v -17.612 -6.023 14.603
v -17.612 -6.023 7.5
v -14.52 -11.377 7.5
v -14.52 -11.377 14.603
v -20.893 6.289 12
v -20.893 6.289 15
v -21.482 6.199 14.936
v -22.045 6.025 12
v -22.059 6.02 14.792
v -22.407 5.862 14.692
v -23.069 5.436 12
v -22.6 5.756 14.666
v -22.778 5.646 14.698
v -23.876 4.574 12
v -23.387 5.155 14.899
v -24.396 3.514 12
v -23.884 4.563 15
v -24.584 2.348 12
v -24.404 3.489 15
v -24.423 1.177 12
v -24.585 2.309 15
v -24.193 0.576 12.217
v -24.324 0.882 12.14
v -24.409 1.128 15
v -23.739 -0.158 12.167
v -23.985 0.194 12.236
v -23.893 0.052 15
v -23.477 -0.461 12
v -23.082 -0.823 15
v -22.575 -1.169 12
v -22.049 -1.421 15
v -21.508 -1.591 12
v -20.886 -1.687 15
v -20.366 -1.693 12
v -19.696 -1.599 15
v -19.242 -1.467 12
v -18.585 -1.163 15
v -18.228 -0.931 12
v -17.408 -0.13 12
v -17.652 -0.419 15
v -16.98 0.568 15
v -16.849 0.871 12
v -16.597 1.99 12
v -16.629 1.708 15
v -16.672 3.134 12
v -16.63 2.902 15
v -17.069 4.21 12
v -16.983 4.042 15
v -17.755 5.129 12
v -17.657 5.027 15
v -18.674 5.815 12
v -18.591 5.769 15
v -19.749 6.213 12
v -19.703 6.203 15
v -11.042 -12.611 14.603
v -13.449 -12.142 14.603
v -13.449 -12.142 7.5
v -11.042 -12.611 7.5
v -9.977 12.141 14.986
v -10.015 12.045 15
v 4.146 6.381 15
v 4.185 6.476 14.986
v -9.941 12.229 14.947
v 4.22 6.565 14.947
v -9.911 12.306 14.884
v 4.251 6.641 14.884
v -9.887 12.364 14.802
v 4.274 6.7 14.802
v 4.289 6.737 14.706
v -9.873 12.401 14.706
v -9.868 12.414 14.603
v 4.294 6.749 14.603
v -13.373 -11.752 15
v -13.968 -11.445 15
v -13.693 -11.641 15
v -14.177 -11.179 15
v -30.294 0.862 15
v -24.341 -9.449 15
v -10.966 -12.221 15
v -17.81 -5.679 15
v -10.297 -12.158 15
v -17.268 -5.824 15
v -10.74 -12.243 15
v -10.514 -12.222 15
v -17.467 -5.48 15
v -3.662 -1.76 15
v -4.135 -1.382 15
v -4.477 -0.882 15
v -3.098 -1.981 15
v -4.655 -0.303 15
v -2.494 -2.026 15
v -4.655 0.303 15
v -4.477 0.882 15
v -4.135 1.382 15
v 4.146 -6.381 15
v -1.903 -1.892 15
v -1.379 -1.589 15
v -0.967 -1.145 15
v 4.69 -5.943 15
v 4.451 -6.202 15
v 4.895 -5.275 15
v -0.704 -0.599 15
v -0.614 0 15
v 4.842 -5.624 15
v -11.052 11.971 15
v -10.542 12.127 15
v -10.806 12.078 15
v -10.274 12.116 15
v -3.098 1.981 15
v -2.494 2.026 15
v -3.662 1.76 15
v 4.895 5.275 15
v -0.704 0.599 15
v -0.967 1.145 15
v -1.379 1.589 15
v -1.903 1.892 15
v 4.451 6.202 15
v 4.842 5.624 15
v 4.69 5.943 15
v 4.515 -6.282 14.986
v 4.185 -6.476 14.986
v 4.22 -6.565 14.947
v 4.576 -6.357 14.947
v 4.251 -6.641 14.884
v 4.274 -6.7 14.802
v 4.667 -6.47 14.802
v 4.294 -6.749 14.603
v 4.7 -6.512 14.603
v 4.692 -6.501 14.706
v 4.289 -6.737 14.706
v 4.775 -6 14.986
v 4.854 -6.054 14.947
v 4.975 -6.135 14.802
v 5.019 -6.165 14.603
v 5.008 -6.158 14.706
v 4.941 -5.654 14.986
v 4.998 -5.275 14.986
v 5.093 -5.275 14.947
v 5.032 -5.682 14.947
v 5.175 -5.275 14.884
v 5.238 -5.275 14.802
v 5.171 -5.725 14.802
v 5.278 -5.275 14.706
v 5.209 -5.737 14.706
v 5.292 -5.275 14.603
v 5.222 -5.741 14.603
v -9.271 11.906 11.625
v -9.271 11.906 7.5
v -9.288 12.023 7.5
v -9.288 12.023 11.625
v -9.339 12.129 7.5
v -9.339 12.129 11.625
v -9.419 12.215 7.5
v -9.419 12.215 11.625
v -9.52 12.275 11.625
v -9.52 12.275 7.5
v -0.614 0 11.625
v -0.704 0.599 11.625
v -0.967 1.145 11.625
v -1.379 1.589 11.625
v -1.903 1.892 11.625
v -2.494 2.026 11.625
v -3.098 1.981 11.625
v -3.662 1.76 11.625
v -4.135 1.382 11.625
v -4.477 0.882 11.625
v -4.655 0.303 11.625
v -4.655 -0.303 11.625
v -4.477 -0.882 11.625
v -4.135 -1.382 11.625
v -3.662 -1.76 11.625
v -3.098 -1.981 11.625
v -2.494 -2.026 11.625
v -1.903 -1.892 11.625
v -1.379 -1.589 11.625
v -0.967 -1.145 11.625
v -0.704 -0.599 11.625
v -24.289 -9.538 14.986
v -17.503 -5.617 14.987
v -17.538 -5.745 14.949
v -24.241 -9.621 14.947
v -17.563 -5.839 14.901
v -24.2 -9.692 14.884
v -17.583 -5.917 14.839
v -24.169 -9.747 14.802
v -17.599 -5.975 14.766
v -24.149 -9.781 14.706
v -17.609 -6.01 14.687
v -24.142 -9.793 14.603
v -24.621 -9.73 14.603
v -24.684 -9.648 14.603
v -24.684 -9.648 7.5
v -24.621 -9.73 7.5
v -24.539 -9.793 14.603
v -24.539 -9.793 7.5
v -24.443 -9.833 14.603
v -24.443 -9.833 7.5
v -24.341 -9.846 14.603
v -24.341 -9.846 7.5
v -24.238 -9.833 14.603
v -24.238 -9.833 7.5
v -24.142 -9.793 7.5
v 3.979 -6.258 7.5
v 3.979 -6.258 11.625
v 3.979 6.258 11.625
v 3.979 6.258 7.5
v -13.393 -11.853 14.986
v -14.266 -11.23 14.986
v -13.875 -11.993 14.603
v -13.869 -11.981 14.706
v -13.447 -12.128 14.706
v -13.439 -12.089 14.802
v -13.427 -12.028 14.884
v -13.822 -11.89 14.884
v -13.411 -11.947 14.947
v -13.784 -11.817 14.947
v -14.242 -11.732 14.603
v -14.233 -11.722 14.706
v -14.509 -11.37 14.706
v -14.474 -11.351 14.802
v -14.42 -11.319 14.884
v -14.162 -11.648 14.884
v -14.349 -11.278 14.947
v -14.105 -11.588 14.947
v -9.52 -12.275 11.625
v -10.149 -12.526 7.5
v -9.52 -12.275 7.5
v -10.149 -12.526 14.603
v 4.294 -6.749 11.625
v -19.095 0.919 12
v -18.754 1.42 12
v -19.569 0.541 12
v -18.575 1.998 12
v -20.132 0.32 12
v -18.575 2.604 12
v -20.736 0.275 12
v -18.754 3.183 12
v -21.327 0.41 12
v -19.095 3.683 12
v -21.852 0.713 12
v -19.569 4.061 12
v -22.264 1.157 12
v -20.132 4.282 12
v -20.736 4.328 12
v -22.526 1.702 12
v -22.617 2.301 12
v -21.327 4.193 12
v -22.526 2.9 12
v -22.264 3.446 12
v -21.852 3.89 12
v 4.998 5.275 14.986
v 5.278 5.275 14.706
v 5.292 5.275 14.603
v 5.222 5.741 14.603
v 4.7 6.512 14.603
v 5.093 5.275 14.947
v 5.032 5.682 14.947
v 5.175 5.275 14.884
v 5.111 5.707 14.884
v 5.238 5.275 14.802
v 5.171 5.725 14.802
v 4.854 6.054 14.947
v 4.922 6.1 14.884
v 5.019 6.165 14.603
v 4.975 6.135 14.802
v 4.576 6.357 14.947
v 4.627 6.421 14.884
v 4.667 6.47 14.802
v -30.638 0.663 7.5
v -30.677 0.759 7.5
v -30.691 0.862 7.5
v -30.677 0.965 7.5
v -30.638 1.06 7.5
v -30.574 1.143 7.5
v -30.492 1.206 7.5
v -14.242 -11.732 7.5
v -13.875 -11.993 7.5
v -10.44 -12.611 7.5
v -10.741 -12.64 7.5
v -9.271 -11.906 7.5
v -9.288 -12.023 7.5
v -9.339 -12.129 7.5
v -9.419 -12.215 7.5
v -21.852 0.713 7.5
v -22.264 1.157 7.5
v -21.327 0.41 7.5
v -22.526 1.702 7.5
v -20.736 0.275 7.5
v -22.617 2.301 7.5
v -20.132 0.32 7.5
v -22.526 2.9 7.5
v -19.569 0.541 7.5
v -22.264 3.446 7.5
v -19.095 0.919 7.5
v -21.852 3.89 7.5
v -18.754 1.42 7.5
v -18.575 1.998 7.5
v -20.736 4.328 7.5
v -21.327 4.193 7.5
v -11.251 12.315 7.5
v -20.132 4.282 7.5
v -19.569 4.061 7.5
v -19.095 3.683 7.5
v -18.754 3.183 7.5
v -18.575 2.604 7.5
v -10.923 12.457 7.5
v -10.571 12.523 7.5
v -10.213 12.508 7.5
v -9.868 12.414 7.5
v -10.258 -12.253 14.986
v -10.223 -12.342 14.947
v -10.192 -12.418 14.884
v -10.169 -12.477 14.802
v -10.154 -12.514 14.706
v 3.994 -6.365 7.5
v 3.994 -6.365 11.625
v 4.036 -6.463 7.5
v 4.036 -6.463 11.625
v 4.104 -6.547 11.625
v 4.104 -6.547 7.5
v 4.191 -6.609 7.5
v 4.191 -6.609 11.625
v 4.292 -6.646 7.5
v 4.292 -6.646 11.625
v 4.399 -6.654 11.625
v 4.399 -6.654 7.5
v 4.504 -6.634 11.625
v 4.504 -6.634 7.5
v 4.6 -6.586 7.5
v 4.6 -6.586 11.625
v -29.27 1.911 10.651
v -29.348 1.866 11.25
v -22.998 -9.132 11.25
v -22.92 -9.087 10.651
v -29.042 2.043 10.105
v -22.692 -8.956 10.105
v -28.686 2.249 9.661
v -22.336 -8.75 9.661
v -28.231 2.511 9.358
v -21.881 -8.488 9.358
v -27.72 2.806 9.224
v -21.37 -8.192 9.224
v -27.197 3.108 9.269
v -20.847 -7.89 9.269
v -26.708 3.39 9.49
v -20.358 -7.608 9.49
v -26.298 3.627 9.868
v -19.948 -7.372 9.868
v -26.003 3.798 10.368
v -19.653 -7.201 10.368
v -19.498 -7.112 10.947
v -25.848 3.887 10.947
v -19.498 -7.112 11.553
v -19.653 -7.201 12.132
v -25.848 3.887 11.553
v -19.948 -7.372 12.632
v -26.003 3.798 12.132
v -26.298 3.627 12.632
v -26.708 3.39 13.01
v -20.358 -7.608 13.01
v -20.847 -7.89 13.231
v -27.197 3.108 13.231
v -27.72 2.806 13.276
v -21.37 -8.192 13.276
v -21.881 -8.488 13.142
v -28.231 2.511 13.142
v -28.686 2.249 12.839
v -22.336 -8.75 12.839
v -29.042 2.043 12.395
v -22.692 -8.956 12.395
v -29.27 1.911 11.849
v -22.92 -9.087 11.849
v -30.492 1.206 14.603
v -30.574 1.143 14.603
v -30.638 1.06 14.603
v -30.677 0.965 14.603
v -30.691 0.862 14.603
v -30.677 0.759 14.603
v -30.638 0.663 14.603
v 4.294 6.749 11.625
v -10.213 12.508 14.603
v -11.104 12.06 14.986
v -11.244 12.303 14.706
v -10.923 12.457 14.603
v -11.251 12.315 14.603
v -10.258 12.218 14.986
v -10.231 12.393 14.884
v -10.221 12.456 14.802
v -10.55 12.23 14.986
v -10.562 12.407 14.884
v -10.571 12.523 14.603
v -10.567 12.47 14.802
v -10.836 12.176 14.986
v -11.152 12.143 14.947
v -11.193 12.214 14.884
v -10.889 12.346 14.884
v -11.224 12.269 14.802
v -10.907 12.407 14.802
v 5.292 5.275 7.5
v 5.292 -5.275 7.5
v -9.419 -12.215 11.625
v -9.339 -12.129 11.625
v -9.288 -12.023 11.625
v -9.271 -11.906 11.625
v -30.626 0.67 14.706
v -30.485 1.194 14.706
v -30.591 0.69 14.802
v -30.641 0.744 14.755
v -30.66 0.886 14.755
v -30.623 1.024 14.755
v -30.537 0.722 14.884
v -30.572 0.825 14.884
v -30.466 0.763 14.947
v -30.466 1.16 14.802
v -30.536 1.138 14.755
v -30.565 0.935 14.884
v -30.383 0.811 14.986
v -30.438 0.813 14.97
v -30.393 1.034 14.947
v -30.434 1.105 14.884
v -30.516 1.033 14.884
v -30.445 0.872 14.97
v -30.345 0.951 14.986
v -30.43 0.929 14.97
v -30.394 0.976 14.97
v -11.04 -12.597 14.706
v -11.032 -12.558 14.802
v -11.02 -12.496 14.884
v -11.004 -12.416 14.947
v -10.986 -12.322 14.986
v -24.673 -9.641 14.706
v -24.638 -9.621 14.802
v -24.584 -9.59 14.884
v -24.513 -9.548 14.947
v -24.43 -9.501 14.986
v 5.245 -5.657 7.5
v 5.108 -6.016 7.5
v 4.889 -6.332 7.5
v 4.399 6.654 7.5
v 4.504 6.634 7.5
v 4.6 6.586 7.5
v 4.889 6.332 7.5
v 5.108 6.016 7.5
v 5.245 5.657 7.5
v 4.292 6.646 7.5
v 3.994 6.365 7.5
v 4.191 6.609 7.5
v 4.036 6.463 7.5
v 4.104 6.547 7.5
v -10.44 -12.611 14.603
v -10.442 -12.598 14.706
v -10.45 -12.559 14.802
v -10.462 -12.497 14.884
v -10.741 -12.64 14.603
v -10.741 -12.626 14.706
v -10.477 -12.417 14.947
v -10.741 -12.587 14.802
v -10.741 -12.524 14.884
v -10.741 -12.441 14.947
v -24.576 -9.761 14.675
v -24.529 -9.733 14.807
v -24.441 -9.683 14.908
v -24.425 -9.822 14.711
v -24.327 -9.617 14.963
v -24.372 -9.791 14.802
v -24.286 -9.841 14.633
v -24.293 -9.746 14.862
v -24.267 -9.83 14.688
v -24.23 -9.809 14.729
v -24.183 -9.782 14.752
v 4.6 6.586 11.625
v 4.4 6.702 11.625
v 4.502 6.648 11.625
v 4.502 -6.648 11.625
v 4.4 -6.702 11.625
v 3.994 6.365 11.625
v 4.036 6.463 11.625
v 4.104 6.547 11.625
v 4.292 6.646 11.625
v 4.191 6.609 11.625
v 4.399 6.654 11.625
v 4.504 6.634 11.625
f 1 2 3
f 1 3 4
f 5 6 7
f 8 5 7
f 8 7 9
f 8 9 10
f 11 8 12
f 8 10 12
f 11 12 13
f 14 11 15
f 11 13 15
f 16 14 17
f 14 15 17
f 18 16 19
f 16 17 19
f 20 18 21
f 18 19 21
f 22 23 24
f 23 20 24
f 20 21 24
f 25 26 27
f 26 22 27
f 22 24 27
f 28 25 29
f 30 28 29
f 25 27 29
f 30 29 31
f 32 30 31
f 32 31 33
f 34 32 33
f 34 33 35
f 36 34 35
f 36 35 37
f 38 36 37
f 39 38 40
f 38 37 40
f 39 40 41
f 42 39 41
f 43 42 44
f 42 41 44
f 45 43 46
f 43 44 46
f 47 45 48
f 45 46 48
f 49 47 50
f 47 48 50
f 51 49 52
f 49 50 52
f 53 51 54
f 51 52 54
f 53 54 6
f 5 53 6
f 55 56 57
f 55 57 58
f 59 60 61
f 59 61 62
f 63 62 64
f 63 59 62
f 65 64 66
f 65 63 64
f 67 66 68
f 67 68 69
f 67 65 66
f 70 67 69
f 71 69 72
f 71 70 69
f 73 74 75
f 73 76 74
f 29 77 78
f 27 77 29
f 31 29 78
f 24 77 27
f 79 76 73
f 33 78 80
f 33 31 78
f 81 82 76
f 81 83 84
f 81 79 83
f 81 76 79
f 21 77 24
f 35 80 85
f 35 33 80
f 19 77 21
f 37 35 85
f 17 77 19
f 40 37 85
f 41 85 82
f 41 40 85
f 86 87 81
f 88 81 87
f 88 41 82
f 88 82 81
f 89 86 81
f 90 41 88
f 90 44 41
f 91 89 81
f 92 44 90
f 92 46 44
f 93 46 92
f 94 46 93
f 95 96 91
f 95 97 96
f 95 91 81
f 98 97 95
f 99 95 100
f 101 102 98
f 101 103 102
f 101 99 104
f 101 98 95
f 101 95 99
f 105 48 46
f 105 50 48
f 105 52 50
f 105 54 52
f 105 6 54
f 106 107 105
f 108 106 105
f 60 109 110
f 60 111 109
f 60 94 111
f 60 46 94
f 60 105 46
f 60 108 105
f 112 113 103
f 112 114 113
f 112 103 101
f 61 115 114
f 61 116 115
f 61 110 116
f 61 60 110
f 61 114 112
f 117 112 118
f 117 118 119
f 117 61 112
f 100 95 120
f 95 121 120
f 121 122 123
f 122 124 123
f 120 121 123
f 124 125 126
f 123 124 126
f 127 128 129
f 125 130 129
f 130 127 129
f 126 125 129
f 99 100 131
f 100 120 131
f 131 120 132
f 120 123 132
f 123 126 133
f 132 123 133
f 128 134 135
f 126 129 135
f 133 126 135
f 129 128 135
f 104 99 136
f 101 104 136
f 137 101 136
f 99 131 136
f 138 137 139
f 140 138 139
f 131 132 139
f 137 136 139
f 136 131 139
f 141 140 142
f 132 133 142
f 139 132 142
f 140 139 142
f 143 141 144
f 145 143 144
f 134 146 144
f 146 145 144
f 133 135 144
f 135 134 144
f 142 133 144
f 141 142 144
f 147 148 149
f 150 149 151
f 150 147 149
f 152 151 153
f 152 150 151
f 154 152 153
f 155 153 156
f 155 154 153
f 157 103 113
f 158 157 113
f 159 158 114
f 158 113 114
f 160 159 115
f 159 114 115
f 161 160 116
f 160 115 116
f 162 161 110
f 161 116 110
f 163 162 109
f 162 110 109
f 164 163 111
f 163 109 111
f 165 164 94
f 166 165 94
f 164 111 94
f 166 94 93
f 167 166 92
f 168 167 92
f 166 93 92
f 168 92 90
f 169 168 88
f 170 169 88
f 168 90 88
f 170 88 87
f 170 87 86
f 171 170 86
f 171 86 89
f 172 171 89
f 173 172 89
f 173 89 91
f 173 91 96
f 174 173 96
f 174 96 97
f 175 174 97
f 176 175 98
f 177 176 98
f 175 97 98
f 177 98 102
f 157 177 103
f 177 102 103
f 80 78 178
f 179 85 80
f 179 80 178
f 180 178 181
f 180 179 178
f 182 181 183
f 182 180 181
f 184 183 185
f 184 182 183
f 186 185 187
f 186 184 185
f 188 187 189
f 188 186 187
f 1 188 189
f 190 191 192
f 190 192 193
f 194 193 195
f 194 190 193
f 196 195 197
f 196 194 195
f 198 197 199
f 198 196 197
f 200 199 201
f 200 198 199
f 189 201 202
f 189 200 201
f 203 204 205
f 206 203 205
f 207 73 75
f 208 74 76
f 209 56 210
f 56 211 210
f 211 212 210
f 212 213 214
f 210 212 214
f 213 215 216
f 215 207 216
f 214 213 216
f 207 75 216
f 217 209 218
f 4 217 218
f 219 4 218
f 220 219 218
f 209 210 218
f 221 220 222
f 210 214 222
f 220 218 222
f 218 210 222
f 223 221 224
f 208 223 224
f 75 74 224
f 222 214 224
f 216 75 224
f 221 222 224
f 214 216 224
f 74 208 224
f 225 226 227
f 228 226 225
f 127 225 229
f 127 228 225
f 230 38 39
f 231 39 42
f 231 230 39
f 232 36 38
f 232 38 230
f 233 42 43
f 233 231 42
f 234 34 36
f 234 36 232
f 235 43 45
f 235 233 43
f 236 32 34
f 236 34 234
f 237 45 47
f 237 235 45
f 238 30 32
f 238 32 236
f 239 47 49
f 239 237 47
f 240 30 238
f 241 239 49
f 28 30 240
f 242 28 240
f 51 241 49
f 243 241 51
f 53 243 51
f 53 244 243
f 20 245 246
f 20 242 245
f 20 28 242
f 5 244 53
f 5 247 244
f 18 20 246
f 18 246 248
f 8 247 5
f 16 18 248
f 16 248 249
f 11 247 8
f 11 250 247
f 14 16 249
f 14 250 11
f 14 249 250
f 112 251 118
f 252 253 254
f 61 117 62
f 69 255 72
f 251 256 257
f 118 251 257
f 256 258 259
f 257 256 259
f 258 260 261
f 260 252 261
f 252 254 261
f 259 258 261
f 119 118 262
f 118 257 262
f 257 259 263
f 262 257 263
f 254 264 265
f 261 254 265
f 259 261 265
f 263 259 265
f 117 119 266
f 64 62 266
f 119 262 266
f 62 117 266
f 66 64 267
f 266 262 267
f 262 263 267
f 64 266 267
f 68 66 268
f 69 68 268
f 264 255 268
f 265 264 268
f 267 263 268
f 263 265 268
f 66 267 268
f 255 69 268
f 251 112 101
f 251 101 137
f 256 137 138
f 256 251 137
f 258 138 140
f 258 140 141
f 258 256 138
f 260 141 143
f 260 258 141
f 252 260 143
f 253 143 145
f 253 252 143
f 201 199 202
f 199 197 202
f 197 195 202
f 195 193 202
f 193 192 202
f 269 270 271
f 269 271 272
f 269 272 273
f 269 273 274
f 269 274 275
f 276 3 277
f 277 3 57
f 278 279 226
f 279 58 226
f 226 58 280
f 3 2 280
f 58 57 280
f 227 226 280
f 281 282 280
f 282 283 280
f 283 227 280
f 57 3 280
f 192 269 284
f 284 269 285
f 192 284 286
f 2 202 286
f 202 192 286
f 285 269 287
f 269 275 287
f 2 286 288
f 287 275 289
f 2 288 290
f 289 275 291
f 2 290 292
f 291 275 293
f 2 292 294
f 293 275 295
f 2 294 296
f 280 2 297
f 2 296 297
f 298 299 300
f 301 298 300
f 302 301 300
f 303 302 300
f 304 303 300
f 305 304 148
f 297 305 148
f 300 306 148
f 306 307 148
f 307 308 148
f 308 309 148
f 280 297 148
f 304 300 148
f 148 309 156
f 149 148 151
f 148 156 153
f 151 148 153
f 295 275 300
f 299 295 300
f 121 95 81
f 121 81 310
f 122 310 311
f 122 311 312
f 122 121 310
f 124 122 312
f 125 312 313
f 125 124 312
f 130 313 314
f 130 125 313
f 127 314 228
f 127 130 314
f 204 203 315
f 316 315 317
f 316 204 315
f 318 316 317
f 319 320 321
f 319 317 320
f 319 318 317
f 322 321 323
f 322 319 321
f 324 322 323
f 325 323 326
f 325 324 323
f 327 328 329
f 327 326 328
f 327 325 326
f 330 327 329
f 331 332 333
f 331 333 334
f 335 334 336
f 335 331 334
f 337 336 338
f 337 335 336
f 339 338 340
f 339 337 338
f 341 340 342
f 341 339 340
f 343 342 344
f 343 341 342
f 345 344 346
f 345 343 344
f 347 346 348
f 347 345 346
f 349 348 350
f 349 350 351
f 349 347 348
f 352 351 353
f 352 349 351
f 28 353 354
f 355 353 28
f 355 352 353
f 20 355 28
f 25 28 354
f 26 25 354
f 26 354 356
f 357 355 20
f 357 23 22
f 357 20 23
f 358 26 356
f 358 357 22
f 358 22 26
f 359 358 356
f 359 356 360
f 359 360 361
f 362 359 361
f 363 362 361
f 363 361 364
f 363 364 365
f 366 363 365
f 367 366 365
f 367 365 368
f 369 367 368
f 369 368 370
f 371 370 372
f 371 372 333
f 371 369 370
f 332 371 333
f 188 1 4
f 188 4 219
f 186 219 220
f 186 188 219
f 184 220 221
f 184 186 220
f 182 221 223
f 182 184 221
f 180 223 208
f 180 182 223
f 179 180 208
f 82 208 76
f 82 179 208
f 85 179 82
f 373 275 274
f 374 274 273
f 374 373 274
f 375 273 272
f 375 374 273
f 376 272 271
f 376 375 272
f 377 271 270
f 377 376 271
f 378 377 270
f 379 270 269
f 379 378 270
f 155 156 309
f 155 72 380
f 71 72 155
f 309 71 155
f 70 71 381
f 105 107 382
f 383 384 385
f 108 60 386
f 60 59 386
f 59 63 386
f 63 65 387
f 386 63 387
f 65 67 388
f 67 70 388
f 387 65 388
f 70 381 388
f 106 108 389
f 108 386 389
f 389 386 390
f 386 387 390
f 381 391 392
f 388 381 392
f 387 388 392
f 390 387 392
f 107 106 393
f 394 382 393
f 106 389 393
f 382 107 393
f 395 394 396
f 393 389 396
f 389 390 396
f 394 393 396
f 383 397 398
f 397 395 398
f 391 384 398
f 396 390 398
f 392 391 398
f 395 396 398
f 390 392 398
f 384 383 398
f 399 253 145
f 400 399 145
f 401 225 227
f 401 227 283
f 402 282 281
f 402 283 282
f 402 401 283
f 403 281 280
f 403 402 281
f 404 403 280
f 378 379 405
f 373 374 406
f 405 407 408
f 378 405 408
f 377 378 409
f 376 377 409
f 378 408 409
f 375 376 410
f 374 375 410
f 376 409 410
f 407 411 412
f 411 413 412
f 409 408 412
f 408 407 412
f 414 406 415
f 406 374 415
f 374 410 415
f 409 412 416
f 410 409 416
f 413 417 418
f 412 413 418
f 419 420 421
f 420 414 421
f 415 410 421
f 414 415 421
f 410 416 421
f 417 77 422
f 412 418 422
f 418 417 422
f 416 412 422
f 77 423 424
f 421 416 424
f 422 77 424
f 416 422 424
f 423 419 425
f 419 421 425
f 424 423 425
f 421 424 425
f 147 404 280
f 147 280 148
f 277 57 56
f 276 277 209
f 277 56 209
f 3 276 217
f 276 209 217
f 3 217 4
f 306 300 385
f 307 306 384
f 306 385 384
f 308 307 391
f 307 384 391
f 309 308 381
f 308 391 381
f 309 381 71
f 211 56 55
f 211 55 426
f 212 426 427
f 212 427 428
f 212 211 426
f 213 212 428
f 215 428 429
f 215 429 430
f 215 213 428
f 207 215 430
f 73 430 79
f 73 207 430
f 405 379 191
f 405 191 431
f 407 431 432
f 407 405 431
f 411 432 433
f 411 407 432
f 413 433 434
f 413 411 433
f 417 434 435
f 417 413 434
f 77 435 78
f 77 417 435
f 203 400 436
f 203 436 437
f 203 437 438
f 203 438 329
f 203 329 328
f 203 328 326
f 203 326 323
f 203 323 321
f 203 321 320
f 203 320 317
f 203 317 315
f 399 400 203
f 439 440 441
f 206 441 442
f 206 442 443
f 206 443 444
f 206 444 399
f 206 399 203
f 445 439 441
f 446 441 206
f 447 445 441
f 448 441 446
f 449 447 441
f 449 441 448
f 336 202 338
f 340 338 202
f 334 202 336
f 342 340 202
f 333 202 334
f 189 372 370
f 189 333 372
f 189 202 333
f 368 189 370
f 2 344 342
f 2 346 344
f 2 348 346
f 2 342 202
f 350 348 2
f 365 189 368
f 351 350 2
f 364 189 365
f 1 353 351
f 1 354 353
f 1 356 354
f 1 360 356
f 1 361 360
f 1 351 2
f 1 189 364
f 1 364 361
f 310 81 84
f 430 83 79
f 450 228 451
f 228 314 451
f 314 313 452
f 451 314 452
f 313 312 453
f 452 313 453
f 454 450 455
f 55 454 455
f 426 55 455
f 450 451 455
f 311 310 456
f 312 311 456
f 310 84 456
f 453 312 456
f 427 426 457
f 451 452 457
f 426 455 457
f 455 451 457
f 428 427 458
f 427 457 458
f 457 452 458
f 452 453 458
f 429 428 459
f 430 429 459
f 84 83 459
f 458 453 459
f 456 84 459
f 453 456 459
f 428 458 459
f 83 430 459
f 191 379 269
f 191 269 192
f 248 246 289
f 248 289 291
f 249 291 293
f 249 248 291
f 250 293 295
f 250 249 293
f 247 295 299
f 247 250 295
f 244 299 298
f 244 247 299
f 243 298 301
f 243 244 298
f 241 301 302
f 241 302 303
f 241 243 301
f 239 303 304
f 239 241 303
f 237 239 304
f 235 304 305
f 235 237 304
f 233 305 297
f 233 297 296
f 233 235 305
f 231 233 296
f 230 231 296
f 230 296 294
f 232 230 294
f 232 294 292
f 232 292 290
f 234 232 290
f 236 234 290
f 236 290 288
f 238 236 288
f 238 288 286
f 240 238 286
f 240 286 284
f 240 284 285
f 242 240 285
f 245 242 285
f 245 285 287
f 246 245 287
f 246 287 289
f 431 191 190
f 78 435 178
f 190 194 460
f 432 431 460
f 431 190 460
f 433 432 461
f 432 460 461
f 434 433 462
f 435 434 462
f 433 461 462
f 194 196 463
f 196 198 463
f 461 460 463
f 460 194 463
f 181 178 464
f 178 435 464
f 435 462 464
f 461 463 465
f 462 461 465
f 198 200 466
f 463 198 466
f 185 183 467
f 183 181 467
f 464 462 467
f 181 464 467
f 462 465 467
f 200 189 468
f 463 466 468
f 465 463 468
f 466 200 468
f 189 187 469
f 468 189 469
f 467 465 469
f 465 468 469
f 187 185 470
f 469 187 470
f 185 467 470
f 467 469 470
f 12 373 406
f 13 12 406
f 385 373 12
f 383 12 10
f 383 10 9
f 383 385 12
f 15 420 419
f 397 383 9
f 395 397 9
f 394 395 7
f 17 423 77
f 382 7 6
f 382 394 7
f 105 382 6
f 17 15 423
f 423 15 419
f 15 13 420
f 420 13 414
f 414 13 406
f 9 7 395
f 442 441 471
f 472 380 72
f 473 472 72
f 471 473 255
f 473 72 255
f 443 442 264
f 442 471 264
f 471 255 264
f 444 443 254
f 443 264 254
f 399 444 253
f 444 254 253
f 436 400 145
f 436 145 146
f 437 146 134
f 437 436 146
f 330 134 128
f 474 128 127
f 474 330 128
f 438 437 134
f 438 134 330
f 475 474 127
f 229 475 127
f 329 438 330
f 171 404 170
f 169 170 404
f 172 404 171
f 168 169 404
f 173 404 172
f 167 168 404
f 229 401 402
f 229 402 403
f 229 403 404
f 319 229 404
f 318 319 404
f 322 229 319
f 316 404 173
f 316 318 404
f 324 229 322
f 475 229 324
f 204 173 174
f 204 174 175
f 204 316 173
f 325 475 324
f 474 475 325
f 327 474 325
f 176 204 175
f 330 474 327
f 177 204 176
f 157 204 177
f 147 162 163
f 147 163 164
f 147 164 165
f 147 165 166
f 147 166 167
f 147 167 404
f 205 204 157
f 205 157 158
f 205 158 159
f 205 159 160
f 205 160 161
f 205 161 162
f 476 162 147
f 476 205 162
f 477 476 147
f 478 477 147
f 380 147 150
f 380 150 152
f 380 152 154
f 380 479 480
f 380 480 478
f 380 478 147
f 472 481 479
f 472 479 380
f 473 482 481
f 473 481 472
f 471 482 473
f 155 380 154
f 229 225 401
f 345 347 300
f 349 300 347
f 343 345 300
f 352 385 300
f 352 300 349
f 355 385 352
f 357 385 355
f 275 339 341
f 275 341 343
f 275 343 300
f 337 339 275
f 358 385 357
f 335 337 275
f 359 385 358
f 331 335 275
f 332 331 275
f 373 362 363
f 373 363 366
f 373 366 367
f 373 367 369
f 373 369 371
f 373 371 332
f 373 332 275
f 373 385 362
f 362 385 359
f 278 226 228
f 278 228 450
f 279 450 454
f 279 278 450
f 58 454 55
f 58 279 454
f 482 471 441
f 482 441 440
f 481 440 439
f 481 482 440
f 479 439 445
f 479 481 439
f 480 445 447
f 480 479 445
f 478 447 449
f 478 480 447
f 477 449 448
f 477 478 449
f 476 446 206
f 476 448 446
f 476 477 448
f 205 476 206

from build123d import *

# Parameters (mm, degrees)
SKETCH1_R           = 2.032
BOSS_EXTRUDE1_DEPTH = 3.375
BOSS_EXTRUDE2_DEPTH = 4.125
SKETCH4_R           = 2.032
BOSS_EXTRUDE3_DEPTH = 7.5
SKETCH5_R           = 2.032
CUT_EXTRUDE1_DEPTH  = 36.913493423
SKETCH6_W           = 7.9375
SKETCH6_H           = 7.5
CUT_EXTRUDE2_DEPTH  = 34.905049671
FILLET1_R           = 1.5875
FILLET2_R           = 0.396875
SKETCH7_R           = 4
CUT_EXTRUDE3_DEPTH  = 3


with BuildPart() as part:
    # Sketch1 → Boss-Extrude1 (new body)
    with BuildSketch(Plane.XY):
        Polygon((5.291666667, -6.35), (-10.583333333, -12.7), (-10.583333333, 12.7), (5.291666667, 6.35), align=None)
        with Locations((-2.645833333, 0)):
            Circle(SKETCH1_R, mode=Mode.SUBTRACT)
    extrude(amount=BOSS_EXTRUDE1_DEPTH)

    # Sketch2 → Boss-Extrude2 (add)
    with BuildSketch(Plane.XY.offset(3.375)):
        Polygon((-10.583333333, 12.7), (-10.583333333, -12.7), (-9.270833333, -12.175), (-9.270833333, 12.175), align=None)
        Polygon((5.291666667, 6.35), (5.291666667, -6.35), (3.979166667, -6.875), (3.979166667, 6.875), align=None)
    extrude(amount=BOSS_EXTRUDE2_DEPTH)

    # Sketch4 → Boss-Extrude3 (add)
    with BuildSketch(Plane(origin=(0, 0, 0), x_dir=(-1, 0, 0), z_dir=(0, 0, -1))):
        Polygon((10.583333333, 12.7), (30.835957968, 1.007141715), (24.485957968, -9.991380913), (10.583333333, -12.7), align=None)
        with Locations((20.584583333, 2.30124)):
            Circle(SKETCH4_R, mode=Mode.SUBTRACT)
    extrude(amount=-BOSS_EXTRUDE3_DEPTH)

    # Sketch5 → Cut-Extrude1 (cut, through all)
    with BuildSketch(Plane(origin=(-8.145094647, 14.107717762, 0), x_dir=(0.8660254037844418, 0.49999999999999467, 0), z_dir=(-0.49999999999999467, 0.8660254037844418, 0))):
        with Locations(Location((-22.451152093, -3.75, 0), (0, 0, 180))):
            Circle(SKETCH5_R)
    extrude(amount=-CUT_EXTRUDE1_DEPTH, mode=Mode.SUBTRACT)

    # Sketch6 → Cut-Extrude2 (cut, through all)
    with BuildSketch(Plane(origin=(-1.795094647, 3.109195134, 0), x_dir=(0.8660254037844418, 0.49999999999999467, 0), z_dir=(-0.49999999999999467, 0.8660254037844418, 0))):
        with Locations((-22.232402093, -3.75)):
            Rectangle(SKETCH6_W, SKETCH6_H)
    extrude(amount=-CUT_EXTRUDE2_DEPTH, mode=Mode.SUBTRACT)

    # Fillet1
    fillet1_edges = [part.edges().sort_by_distance(p)[0] for p in [
        (-14.158893581, -12.003381125, 3.75),
        (-10.583333333, 12.7, 3.75),
        (5.291666667, 6.35, 3.75),
        (5.291666667, -6.35, 3.75),
        (-10.583333333, -12.7, 3.75),
    ]]
    fillet(fillet1_edges, radius=FILLET1_R)

    # Fillet2
    # the kernel refuses this fillet: 0.396875 mm, written as the material it takes off along each edge
    with BuildSketch(Plane(origin=(-30.293816636, 0.861875383, 0.396875), x_dir=(-0.49999999999999467, 0.8660254037844418, 0), z_dir=(0, 0, -1))) as fillet2_piece_1_section:
        Polygon((0, 0), (FILLET2_R, 0), (FILLET2_R, -FILLET2_R), (0, -FILLET2_R), align=None)
    fillet2_piece_1 = extrude(amount=FILLET2_R, mode=Mode.PRIVATE)
    fillet2_piece_1 = fillet2_piece_1 - Plane(origin=(-30.293816636, 0.861875383, 0.396875), x_dir=(0.9659258262890668, -0.25881904510252635, 0), z_dir=(0, 0, -1)) * Sphere(FILLET2_R, mode=Mode.PRIVATE)
    add(fillet2_piece_1, mode=Mode.SUBTRACT)
    with BuildSketch(Plane(origin=(-24.340691636, -9.449239581, 0.396875), x_dir=(0, 0, -1), z_dir=(0.49999999999999467, -0.8660254037844418, 0))) as fillet2_piece_2_section:
        Polygon((0, 0), (FILLET2_R, 0), (FILLET2_R, -FILLET2_R), (0, -FILLET2_R), align=None)
    fillet2_piece_2 = extrude(amount=FILLET2_R, mode=Mode.PRIVATE)
    fillet2_piece_2 = fillet2_piece_2 - Plane(origin=(-24.340691636, -9.449239581, 0.396875), x_dir=(0.6123724356957964, 0.35355339059327046, 0.7071067811865475), z_dir=(0.49999999999999467, -0.8660254037844418, 0)) * Sphere(FILLET2_R, mode=Mode.PRIVATE)
    add(fillet2_piece_2, mode=Mode.SUBTRACT)
    with BuildSketch(Plane(origin=(-9.270833333, 12.175, 3.375), x_dir=(0, -1, 0), z_dir=(0, 0, 1)), Plane(origin=(-9.270833333, -12.175, 3.375), x_dir=(-0.9284766908852634, -0.37139067635409345, 0), z_dir=(0, 0, 1))) as fillet2_piece_3:
        with BuildLine():
            CenterArc((FILLET2_R * 0.677032961427, -FILLET2_R), FILLET2_R, 90, 68.198590514)
            Line((-FILLET2_R * 0.251443729458, -FILLET2_R * 0.628609323646), (0, 0))
            Line((0, 0), (FILLET2_R * 0.677032961427, 0))
        make_face()
    extrude(amount=4.796743641, mode=Mode.SUBTRACT)
    with BuildSketch(Plane(origin=(3.979166667, 6.875, 3.375), x_dir=(0, -1, 0), z_dir=(0, 0, 1))) as fillet2_piece_4:
        with BuildLine():
            CenterArc((0.616849403, 0.396875), FILLET2_R, 145.645994163, 124.354005837)
            Line((0.289202596, 0.620833333), (0.256437915, 0.643229167))
            ThreePointArc((0.256437915, 0.643229167), (0.088984161, 0.329322266), (-0.036848919, 0.014739567))
            Line((-0.036848919, 0.014739567), (0, -0.0396875))
            Line((0, -0.0396875), (0.616849403, -0.0396875))
            Line((0.616849403, -0.0396875), (0.616849403, 0))
        make_face()
    extrude(amount=5.837221089, mode=Mode.SUBTRACT)
    with BuildSketch(Plane(origin=(3.979166667, -6.875, 3.375), x_dir=(0.9064736694503883, 0.4222623433283487, 0), z_dir=(0, 0, 1))) as fillet2_piece_5:
        with BuildLine():
            CenterArc((0.620229012, 0.391572375), FILLET2_R, 155.022498711, 124.354005837)
            Line((0.260472275, 0.559157742), (0.224496601, 0.575916279))
            Line((0.224496601, 0.575916279), (-0.035975674, 0.016758537))
            Line((-0.035975674, 0.016758537), (-0.002198881, -0.039626539))
            ThreePointArc((-0.002198881, -0.039626539), (0.336096623, -0.058398593), (0.691354378, -0.039157237))
            Line((0.691354378, -0.039157237), (0.684888436, 0))
        make_face()
    extrude(amount=5.837221089, mode=Mode.SUBTRACT)
    with BuildSketch(Plane(origin=(-30.835957968, 1.007141715, 0.396875), x_dir=(0.866025403784441, 0.4999999999999959, 0), z_dir=(0, 0, 1)), Plane(origin=(-24.485957968, -9.991380913, 0.396875), x_dir=(-0.4999999999999916, 0.8660254037844436, 0), z_dir=(0, 0, 1))) as fillet2_piece_6:
        with BuildLine():
            CenterArc((FILLET2_R, -FILLET2_R), FILLET2_R, 90, 90)
            Line((0, -FILLET2_R), (0, 0))
            Line((0, 0), (FILLET2_R, 0))
        make_face()
    extrude(amount=8.0953125, mode=Mode.SUBTRACT)
    with BuildSketch(Plane(origin=(-30.637520468, 0.663437883, 0), x_dir=(0.8660254037844414, 0.4999999999999952, 0), z_dir=(0.49999999999999534, -0.8660254037844414, 0))) as fillet2_piece_7:
        with BuildLine():
            CenterArc((FILLET2_R, FILLET2_R), FILLET2_R, 180, 90)
            Line((0, FILLET2_R), (0, 0))
            Line((0, 0), (FILLET2_R, 0))
        make_face()
    extrude(amount=11.90625, mode=Mode.SUBTRACT)
    with BuildSketch(Plane(origin=(-11.250928686, 12.314563643, 0), x_dir=(0.49999999999999467, -0.8660254037844418, 0), z_dir=(-0.8660254037844418, -0.49999999999999467, 0))) as fillet2_piece_8:
        with BuildLine():
            CenterArc((FILLET2_R, FILLET2_R), FILLET2_R, 180, 90)
            Line((0, FILLET2_R), (0, 0))
            Line((0, 0), (FILLET2_R, 0))
        make_face()
    extrude(amount=22.217968856, mode=Mode.SUBTRACT)
    with BuildSketch(Plane(origin=(-17.611881326, -6.022630913, 0), x_dir=(-0.49999999999999467, 0.8660254037844418, 0), z_dir=(-0.8660254037844418, -0.49999999999999467, 0))) as fillet2_piece_9:
        with BuildLine():
            CenterArc((FILLET2_R, -FILLET2_R), FILLET2_R, 90, 90)
            Line((0, -FILLET2_R), (0, 0))
            Line((0, 0), (FILLET2_R, 0))
        make_face()
    extrude(amount=7.540625, mode=Mode.SUBTRACT)
    with BuildSketch(Plane(origin=(-17.611881326, -6.022630913, 0), x_dir=(0.8660254037844417, 0.49999999999999467, 0), z_dir=(0.4999999999999947, -0.8660254037844418, 0))) as fillet2_piece_10:
        with BuildLine():
            CenterArc((FILLET2_R, FILLET2_R), FILLET2_R, 180, 90)
            Line((0, FILLET2_R), (0, 0))
            Line((0, 0), (FILLET2_R, 0))
        make_face()
    extrude(amount=6.182923419, mode=Mode.SUBTRACT)
    with BuildSketch(Plane(origin=(-13.449185577, -12.141652041, 0), x_dir=(0.19123230784154585, 0.9815448051095764, 0), z_dir=(0.9815448051095764, -0.19123230784154585, 0))) as fillet2_piece_11:
        with BuildLine():
            CenterArc((FILLET2_R, FILLET2_R), FILLET2_R, 180, 90)
            Line((0, FILLET2_R), (0, 0))
            Line((0, 0), (FILLET2_R, 0))
        make_face()
    extrude(amount=2.452116689, mode=Mode.SUBTRACT)
    with BuildSketch(Plane(origin=(-9.867595987, 12.413705062, 0), x_dir=(-0.37139067635410367, -0.9284766908852593, 0), z_dir=(0.9284766908852594, -0.3713906763541037, 0))) as fillet2_piece_12:
        with BuildLine():
            CenterArc((FILLET2_R, -FILLET2_R), FILLET2_R, 90, 90)
            Line((0, -FILLET2_R), (0, 0))
            Line((0, 0), (FILLET2_R, 0))
        make_face()
    extrude(amount=15.252235723, mode=Mode.SUBTRACT)
    with BuildSketch(Plane(origin=(5.291666667, 5.275210174, 0), x_dir=(-1, 0, 0), z_dir=(0, -1, 0))) as fillet2_piece_13:
        with BuildLine():
            CenterArc((FILLET2_R, -FILLET2_R), FILLET2_R, 90, 90)
            Line((0, -FILLET2_R), (0, 0))
            Line((0, 0), (FILLET2_R, 0))
        make_face()
    extrude(amount=10.550420347, mode=Mode.SUBTRACT)
    with BuildSketch(Plane(origin=(4.293749365, -6.749166921, 0), x_dir=(0, 0, 1), z_dir=(-0.9284766908852594, -0.3713906763541037, 0))) as fillet2_piece_14:
        with BuildLine():
            CenterArc((FILLET2_R, FILLET2_R), FILLET2_R, 180, 90)
            Line((0, FILLET2_R), (0, 0))
            Line((0, 0), (FILLET2_R, 0))
        make_face()
    extrude(amount=15.555488575, mode=Mode.SUBTRACT)
    with BuildSketch(Plane(origin=(-10.73874189, -11.052373597, 0), x_dir=(0.37139067635410195, -0.92847669088526, 0), z_dir=(0.92847669088526, 0.37139067635410195, 0))) as fillet2_piece_15:
        with BuildLine():
            CenterArc((1.5875 - FILLET2_R, -FILLET2_R), FILLET2_R, 0, 90)
            Line((1.5875, -FILLET2_R), (1.5875, 0))
            Line((1.5875, 0), (1.5875 - FILLET2_R, 0))
        make_face()
    revolve(axis=Axis((-10.73874189, -11.052373597, 0), (0, 0, -1)), revolution_arc=32.826118495, mode=Mode.SUBTRACT)
    with BuildSketch(Plane(origin=(3.704166667, 5.275210174, 0), x_dir=(1, 0, 0), z_dir=(0, -1, 0))) as fillet2_piece_16:
        with BuildLine():
            CenterArc((1.5875 - FILLET2_R, FILLET2_R), FILLET2_R, 270, 90)
            Line((1.5875, FILLET2_R), (1.5875, 0))
            Line((1.5875, 0), (1.5875 - FILLET2_R, 0))
        make_face()
    revolve(axis=Axis((3.704166667, 5.275210174, 0), (0, 0, 1)), revolution_arc=68.198590514, mode=Mode.SUBTRACT)
    with BuildSketch(Plane(origin=(3.704166667, -5.275210174, 0), x_dir=(0.37139067635410355, -0.9284766908852593, 0), z_dir=(-0.9284766908852593, -0.37139067635410355, 0))) as fillet2_piece_17:
        with BuildLine():
            CenterArc((1.5875 - FILLET2_R, FILLET2_R), FILLET2_R, 270, 90)
            Line((1.5875 - FILLET2_R, 0), (1.5875, 0))
            Line((1.5875, 0), (1.5875, FILLET2_R))
        make_face()
    revolve(axis=Axis((3.704166667, -5.275210174, 0), (0, 0, 1)), revolution_arc=68.198590514, mode=Mode.SUBTRACT)
    with BuildSketch(Plane(origin=(-10.457178686, 10.939748315, 0), x_dir=(0.37139067635410433, 0.9284766908852591, 0), z_dir=(0.9284766908852591, -0.37139067635410433, 0))) as fillet2_piece_18:
        with BuildLine():
            CenterArc((1.5875 - FILLET2_R, FILLET2_R), FILLET2_R, 270, 90)
            Line((1.5875, FILLET2_R), (1.5875, 0))
            Line((1.5875, 0), (1.5875 - FILLET2_R, 0))
        make_face()
    revolve(axis=Axis((-10.457178686, 10.939748315, 0), (0, 0, 1)), revolution_arc=51.801409486, mode=Mode.SUBTRACT)
    with BuildSketch(Plane(origin=(-13.145604288, -10.583449663, 0), x_dir=(-0.19123230784154518, -0.9815448051095765, 0), z_dir=(0.9815448051095765, -0.19123230784154518, 0))) as fillet2_piece_19:
        with BuildLine():
            CenterArc((1.5875 - FILLET2_R, -FILLET2_R), FILLET2_R, 0, 90)
            Line((1.5875, -FILLET2_R), (1.5875, 0))
            Line((1.5875, 0), (1.5875 - FILLET2_R, 0))
        make_face()
    revolve(axis=Axis((-13.145604288, -10.583449663, 0), (0, 0, -1)), revolution_arc=48.975290991, mode=Mode.SUBTRACT)
    with BuildSketch(Plane(origin=(-16.752621745, -5.526537163, 0), x_dir=(-0.49999999999999467, 0.8660254037844418, 0), z_dir=(-0.8660254037844418, -0.49999999999999467, 0))) as fillet2_piece_20a_section:
        with BuildLine():
            CenterArc((FILLET2_R, -FILLET2_R), FILLET2_R, 90, 90)
            Line((0, -FILLET2_R), (0, 0))
            Line((0, 0), (FILLET2_R, 0))
        make_face()
    fillet2_piece_20a = extrude(amount=8.5328125, mode=Mode.PRIVATE)
    fillet2_piece_20a = split(fillet2_piece_20a, bisect_by=Plane(origin=(-17.656806606, -5.944818045, 0.089850561), z_dir=(0.8660254037844418, 0.4999999999999947, 0)), keep=Keep.TOP, mode=Mode.PRIVATE)
    with BuildSketch(Plane(origin=(-18.107975076, -5.163371333, 0), x_dir=(0.8660254037844417, 0.49999999999999467, 0), z_dir=(0.4999999999999947, -0.8660254037844418, 0))) as fillet2_piece_20b_section:
        with BuildLine():
            CenterArc((FILLET2_R, FILLET2_R), FILLET2_R, 180, 90)
            Line((0, FILLET2_R), (0, 0))
            Line((0, 0), (FILLET2_R, 0))
        make_face()
    fillet2_piece_20b = extrude(amount=7.175110919, mode=Mode.PRIVATE)
    fillet2_piece_20b = split(fillet2_piece_20b, bisect_by=Plane(origin=(-17.534068457, -5.977705632, 0.089850561), z_dir=(-0.49999999999999467, 0.8660254037844418, 0)), keep=Keep.TOP, mode=Mode.PRIVATE)
    fillet2_piece_20 = fillet2_piece_20a & fillet2_piece_20b
    add(fillet2_piece_20, mode=Mode.SUBTRACT)


with BuildPart() as body_2:
    # Mirror1: mirrored copy
    add(part.part.mirror(Plane.XY.offset(7.5)))

    # Sketch7 → Cut-Extrude3 (cut)
    with BuildSketch(Plane.XY.offset(15)):
        with Locations(Location((-20.584583333, 2.30124, 0), (0, 0, 94.425213479))):
            Circle(SKETCH7_R)
    extrude(amount=-CUT_EXTRUDE3_DEPTH, mode=Mode.SUBTRACT)


solid = body_2.part
